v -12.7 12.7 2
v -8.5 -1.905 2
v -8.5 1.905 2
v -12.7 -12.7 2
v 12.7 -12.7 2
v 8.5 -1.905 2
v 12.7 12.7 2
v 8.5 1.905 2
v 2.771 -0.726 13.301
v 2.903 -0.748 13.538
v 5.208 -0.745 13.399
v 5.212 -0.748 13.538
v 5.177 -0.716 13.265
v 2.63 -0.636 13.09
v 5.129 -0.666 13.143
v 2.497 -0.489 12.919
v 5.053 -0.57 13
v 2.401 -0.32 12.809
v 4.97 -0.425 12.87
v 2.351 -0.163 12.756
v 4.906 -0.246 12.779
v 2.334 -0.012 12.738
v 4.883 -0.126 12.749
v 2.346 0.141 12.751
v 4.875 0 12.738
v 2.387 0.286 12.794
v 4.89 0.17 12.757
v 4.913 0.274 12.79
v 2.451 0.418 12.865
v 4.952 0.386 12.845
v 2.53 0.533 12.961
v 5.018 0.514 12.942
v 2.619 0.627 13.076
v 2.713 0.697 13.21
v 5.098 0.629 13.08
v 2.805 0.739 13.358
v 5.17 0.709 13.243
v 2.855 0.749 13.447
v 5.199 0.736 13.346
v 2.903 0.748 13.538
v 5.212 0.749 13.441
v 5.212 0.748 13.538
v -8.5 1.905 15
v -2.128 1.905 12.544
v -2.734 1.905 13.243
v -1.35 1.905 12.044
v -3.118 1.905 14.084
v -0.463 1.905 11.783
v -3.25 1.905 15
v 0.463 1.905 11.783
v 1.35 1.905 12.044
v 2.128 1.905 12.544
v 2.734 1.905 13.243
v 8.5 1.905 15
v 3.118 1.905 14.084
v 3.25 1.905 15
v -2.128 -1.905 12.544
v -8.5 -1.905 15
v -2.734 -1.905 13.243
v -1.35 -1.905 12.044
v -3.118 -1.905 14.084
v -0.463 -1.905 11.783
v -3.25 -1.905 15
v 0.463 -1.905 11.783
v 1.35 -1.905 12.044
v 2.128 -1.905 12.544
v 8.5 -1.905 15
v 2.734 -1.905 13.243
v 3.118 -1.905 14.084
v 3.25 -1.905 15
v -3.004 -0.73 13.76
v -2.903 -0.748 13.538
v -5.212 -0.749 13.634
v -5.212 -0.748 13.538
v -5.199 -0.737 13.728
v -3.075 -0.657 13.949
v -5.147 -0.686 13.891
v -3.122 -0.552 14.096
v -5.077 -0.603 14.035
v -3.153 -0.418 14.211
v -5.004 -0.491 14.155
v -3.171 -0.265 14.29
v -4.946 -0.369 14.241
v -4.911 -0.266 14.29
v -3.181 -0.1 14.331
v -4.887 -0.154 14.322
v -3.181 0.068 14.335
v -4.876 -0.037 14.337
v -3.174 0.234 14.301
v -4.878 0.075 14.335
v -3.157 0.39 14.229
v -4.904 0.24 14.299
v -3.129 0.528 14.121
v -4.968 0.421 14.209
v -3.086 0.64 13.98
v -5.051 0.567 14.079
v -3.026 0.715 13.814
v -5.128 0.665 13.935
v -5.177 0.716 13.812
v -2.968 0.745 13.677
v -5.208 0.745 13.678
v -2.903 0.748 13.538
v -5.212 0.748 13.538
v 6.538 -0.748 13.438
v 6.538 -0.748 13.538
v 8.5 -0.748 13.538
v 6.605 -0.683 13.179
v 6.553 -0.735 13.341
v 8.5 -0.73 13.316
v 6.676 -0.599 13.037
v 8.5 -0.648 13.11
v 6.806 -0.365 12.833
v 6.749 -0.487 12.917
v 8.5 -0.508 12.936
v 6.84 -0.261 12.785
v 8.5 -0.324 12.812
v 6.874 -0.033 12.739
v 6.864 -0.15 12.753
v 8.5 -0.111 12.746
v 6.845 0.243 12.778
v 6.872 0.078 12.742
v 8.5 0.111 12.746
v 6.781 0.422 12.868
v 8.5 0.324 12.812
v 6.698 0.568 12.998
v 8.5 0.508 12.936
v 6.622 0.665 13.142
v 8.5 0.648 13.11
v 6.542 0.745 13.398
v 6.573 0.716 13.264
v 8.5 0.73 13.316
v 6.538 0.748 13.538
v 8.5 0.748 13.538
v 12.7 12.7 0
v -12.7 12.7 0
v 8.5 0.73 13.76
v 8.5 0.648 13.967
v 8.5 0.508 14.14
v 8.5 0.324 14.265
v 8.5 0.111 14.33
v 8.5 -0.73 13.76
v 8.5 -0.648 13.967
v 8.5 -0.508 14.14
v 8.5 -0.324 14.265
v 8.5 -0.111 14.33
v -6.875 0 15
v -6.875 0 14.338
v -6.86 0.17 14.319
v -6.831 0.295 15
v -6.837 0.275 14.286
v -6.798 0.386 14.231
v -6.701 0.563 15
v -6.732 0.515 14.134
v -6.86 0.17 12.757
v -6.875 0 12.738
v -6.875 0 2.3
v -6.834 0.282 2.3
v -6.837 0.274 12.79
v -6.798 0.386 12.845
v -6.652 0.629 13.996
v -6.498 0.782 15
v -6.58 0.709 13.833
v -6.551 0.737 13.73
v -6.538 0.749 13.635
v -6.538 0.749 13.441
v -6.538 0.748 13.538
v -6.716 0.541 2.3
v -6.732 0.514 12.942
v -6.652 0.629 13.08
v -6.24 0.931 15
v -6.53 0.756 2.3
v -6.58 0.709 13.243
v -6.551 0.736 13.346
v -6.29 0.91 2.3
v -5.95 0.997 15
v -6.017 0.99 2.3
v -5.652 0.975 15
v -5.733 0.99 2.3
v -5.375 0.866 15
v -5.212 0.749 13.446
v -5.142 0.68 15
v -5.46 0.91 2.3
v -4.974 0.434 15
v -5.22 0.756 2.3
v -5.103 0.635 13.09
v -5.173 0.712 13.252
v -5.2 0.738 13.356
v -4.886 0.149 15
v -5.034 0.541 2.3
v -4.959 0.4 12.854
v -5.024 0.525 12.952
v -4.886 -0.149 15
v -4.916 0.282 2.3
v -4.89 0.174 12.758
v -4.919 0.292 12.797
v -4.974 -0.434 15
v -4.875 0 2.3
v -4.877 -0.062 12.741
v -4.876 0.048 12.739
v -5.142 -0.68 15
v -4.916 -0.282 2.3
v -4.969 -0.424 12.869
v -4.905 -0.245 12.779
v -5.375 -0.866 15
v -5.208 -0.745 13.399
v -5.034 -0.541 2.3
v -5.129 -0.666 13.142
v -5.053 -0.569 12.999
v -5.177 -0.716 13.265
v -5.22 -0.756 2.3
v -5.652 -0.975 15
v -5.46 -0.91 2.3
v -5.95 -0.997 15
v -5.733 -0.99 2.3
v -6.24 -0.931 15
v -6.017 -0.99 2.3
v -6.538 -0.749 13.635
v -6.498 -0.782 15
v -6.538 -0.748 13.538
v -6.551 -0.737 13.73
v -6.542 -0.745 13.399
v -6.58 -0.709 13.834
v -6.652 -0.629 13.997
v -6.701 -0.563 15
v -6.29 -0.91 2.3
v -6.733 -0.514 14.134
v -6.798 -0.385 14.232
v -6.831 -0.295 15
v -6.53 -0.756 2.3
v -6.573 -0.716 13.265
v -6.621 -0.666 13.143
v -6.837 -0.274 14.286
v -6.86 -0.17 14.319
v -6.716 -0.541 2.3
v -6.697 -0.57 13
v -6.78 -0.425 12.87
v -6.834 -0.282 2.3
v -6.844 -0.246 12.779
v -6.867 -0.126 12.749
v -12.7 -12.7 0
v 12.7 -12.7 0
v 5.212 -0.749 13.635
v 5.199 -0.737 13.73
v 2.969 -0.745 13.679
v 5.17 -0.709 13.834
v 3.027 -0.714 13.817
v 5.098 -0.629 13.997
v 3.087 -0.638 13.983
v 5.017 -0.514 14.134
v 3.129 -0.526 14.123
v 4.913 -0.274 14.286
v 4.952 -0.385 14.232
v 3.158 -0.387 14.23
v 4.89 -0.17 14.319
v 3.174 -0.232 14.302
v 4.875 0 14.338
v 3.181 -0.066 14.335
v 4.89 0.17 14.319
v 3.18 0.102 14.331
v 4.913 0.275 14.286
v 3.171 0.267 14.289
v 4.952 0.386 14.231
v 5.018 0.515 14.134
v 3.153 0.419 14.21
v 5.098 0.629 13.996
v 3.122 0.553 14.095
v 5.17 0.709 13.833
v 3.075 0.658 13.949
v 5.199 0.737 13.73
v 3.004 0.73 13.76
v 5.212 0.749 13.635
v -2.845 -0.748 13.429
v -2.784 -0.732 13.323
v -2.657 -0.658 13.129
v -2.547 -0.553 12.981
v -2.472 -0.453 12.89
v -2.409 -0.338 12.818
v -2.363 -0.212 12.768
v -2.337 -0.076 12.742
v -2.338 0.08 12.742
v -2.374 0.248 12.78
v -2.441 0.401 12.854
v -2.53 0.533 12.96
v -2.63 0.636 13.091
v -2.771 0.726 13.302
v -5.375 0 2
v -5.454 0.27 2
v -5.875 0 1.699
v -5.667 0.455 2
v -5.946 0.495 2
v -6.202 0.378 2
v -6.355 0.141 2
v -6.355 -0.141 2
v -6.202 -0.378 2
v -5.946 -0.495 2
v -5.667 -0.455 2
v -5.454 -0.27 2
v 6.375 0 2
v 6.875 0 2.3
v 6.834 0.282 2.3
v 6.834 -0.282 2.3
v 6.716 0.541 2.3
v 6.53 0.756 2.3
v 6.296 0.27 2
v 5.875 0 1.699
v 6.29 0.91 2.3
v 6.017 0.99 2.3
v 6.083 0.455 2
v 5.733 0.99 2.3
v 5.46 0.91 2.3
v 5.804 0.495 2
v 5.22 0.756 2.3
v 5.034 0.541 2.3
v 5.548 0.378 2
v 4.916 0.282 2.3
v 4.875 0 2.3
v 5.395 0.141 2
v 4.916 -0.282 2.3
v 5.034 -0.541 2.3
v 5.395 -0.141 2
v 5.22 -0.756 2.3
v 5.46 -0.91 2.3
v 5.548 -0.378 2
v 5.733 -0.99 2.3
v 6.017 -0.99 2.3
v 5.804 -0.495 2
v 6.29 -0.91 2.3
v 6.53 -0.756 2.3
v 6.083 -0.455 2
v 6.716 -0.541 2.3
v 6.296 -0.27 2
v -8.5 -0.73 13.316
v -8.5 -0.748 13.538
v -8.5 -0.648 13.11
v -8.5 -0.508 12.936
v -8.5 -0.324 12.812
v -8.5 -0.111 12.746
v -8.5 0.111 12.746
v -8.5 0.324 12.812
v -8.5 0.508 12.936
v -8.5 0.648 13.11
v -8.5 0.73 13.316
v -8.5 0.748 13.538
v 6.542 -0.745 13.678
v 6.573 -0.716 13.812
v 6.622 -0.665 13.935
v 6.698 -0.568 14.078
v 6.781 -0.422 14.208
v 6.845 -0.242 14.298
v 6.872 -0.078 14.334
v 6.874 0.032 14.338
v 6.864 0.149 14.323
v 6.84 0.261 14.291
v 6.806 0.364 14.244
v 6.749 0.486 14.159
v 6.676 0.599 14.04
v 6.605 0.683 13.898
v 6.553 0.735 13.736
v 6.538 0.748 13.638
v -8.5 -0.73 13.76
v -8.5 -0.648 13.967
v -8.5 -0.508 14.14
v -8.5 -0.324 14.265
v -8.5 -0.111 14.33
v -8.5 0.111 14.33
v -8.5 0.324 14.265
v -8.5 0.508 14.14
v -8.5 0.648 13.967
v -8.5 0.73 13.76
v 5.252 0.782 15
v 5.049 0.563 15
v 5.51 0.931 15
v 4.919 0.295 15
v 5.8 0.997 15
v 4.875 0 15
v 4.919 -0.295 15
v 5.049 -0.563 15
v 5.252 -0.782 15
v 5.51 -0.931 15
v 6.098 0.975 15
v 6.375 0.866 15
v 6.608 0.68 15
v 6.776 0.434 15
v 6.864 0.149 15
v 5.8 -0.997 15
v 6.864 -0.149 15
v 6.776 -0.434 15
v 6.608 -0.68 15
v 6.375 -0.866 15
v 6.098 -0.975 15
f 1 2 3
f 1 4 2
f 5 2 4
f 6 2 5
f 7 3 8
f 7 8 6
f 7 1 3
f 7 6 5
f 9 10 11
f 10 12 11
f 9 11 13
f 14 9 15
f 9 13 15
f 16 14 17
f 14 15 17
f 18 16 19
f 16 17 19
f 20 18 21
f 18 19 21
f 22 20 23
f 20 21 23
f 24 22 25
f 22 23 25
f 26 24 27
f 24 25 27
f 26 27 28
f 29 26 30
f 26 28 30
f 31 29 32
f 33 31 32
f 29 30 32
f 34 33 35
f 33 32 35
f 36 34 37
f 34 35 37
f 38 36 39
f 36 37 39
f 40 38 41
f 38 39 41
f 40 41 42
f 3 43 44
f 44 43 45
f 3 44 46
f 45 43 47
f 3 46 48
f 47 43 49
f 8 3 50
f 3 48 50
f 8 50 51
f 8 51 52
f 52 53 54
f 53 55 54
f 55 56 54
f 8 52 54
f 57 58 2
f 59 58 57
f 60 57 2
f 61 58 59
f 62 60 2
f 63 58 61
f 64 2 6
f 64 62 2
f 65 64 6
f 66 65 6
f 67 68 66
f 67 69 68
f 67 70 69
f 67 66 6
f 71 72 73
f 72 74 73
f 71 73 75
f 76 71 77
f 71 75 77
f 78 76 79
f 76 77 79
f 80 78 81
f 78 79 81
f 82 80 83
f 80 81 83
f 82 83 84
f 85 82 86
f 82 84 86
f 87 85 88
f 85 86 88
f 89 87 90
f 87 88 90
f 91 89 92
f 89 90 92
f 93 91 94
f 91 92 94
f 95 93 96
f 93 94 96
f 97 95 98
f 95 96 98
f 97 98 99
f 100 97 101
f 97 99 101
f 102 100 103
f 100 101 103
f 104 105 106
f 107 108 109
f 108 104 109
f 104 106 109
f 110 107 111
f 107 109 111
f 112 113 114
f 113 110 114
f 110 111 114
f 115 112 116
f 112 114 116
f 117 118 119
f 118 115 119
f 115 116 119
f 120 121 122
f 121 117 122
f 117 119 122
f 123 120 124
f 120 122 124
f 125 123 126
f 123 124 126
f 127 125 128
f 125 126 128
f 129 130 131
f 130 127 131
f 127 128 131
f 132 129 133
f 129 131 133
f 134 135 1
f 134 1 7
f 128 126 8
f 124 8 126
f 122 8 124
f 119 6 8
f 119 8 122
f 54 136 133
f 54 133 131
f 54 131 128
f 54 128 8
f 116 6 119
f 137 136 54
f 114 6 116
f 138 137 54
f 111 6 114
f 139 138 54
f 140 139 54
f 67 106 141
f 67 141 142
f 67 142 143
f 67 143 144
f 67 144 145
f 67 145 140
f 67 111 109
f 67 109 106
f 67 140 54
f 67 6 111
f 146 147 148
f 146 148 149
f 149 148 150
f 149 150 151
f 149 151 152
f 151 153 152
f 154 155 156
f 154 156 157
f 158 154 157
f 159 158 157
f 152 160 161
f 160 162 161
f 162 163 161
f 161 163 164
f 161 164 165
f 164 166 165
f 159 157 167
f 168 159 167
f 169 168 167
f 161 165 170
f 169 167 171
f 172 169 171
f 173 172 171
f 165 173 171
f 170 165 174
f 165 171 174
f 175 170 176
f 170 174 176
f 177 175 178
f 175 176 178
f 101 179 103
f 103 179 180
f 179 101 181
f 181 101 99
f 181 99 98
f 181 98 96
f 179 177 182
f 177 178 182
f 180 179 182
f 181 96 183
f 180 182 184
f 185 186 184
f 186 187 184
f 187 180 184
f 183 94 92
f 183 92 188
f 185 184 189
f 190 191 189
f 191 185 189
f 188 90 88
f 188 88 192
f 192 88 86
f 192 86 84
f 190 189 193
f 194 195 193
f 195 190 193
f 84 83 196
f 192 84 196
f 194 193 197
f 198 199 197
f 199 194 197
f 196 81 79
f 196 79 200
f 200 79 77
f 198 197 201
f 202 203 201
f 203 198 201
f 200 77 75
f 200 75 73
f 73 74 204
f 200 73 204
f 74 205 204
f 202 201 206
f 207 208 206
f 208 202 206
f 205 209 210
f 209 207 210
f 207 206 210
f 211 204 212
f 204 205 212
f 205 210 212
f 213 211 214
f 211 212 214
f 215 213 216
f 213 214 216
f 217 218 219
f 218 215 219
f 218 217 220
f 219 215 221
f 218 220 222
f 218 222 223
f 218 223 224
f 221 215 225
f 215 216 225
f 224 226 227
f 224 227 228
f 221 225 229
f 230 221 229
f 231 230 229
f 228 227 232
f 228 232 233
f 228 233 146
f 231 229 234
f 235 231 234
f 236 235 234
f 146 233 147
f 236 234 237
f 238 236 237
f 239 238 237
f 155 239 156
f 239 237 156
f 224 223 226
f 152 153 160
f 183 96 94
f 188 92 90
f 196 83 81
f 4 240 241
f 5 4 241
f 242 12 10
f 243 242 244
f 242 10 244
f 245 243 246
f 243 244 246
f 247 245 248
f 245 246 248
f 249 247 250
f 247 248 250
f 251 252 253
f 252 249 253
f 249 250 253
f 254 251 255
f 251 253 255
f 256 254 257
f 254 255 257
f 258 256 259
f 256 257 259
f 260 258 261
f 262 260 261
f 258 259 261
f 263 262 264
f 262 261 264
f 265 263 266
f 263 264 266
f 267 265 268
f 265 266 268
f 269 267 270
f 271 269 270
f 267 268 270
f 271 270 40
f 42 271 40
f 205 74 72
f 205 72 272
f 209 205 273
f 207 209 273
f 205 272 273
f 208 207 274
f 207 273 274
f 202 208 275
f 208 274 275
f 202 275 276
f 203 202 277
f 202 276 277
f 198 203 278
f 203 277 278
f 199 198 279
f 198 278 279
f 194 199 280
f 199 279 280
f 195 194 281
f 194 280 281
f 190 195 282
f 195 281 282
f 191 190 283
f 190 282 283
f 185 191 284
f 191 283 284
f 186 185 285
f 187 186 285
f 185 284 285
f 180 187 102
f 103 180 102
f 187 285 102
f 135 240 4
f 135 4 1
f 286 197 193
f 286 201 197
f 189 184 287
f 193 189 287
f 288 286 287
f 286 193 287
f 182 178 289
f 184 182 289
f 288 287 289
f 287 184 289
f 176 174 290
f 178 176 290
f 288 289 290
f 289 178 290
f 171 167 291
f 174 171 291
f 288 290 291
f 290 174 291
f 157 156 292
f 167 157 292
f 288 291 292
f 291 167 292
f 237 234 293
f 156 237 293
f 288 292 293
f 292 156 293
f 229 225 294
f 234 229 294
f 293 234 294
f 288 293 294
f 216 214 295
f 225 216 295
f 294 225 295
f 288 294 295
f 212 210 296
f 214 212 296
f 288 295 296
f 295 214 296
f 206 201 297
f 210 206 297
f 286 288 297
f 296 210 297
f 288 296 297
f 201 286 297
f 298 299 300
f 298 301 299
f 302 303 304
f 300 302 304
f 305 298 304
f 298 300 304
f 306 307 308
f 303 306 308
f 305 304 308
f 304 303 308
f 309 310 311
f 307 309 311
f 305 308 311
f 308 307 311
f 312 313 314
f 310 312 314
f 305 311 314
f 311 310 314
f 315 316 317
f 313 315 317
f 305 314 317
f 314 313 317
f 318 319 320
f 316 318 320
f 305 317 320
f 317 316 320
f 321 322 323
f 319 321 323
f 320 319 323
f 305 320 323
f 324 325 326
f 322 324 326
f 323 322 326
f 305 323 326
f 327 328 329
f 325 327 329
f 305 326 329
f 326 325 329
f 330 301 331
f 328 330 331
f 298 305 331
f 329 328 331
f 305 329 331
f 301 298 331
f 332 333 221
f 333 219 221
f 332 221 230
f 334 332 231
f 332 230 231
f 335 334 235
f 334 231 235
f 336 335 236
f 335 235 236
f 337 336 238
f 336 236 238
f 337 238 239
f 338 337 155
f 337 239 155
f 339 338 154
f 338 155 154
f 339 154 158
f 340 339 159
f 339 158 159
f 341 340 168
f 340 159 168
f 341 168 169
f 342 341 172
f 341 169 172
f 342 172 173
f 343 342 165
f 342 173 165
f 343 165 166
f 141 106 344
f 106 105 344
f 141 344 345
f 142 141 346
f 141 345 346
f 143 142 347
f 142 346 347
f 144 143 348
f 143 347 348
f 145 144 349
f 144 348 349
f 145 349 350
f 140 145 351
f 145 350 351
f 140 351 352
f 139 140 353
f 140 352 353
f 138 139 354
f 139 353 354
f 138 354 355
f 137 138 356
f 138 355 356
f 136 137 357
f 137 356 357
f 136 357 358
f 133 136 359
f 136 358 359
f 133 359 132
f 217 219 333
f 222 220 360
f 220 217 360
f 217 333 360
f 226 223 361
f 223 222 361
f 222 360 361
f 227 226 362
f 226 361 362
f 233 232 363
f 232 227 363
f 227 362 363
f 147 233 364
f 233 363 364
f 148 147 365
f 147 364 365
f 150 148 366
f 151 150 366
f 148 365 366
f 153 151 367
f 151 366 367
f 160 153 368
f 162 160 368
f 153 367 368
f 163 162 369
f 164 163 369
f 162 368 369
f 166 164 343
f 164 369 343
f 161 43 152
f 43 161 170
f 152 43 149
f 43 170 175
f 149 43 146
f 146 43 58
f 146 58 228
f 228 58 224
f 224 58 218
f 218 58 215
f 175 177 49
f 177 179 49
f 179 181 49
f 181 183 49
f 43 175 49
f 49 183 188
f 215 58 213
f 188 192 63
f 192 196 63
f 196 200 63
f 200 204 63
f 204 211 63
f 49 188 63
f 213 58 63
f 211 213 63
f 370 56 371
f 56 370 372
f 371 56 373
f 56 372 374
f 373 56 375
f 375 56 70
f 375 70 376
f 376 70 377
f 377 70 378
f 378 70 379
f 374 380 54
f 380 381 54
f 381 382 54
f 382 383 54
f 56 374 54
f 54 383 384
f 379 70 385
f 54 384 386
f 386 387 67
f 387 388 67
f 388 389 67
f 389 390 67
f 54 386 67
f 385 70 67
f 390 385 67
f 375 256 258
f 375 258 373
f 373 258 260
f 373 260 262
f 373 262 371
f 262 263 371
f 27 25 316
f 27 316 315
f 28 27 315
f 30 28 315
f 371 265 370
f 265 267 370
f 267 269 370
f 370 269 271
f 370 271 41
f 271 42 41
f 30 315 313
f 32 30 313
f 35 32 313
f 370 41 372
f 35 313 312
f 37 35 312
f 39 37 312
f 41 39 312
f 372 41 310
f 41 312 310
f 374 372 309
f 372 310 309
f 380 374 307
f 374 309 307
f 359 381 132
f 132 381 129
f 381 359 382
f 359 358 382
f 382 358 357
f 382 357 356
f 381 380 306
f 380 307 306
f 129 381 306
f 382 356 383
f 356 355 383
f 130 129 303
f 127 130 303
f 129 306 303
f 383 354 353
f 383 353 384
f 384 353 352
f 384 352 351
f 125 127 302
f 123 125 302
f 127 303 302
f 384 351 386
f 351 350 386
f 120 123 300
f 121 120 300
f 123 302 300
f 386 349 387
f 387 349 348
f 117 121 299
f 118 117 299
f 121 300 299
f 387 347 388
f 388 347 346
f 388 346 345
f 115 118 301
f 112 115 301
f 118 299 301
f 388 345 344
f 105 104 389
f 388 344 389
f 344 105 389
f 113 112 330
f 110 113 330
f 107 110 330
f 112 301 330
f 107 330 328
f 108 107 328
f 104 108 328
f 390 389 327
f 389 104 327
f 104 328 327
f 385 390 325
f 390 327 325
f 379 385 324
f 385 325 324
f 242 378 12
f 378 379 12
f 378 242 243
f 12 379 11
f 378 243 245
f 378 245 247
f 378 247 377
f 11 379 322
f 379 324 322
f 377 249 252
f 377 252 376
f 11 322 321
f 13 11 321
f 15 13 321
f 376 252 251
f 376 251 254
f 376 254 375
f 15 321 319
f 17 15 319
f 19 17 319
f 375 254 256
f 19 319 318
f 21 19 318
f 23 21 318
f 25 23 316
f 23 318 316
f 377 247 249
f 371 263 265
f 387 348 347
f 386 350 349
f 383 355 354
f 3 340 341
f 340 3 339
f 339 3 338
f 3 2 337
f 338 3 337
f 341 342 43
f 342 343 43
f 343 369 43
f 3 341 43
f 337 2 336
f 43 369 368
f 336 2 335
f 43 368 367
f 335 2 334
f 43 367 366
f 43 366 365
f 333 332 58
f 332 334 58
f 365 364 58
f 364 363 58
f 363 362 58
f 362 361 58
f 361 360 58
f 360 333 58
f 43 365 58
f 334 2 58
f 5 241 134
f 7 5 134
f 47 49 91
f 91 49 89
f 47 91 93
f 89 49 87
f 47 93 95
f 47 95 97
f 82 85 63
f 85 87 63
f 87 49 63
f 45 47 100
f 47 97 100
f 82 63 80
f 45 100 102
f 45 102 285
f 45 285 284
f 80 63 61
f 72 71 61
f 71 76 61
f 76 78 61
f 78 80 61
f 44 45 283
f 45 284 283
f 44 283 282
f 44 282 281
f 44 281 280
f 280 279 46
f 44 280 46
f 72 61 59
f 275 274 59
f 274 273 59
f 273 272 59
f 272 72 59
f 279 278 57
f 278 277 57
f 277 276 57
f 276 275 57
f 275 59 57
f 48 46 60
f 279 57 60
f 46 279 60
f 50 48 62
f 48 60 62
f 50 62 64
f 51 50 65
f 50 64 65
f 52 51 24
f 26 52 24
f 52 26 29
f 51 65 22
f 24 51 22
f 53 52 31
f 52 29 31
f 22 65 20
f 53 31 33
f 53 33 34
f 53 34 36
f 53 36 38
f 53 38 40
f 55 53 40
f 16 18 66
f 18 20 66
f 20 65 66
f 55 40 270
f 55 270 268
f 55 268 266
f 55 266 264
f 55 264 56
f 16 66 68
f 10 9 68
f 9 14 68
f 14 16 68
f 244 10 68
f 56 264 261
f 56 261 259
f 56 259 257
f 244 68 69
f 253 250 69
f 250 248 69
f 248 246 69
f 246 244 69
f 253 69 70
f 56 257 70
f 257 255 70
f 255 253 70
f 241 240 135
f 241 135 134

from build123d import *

# Parameters (mm, degrees)
F0_W        = 25.4
F0_H        = 25.4
F1_DEPTH    = 2
F2_W        = 17
F2_H        = 15
F3_DEPTH    = 1.905
F4_R        = 3.25
F5_DEPTH    = 2.6162
F7_D        = 2
F7_DEPTH    = 12.7
F7_TIP      = 0.600860619
F10_D       = 1.5
F10_ON_F8_D = 1.5


with BuildPart() as f1:
    # F0 (on Top) → F1 (new body)
    with BuildSketch(Plane.XY):
        Rectangle(F0_W, F0_H)
    extrude(amount=F1_DEPTH)

    # F2 (on Front) → F3 (join, symmetric)
    with BuildSketch(Plane.XZ):
        with Locations((0, 7.5)):
            Rectangle(F2_W, F2_H)
    extrude(amount=F3_DEPTH, both=True)

    # F4 (on Front) → F5 (cut, symmetric)
    with BuildSketch(Plane.XZ):
        with Locations((0, 15)):
            Circle(F4_R)
    extrude(amount=F5_DEPTH, both=True, mode=Mode.SUBTRACT)

    # F7
    with Locations(Plane.XY.offset(15)):
        with Locations((5.875, 0), (-5.875, 0)):
            Hole(F7_D / 2, depth=F7_DEPTH)
            with Locations((0, 0, -(F7_DEPTH + F7_TIP / 2))):  # 118° drill point
                Cone(0, F7_D / 2, F7_TIP, mode=Mode.SUBTRACT)

    # F10 (through all)
    with Locations(Plane.YZ.offset(8.5)):
        with Locations((0, 13.5882580653)):
            Hole(F10_D / 2)

    # F10 on F8 (through all)
    with Locations(Plane(origin=(-8.5, 0, 0), x_dir=(0, -1, 0), z_dir=(-1, 0, 0))):
        with Locations((0, 13.4879248217)):
            Hole(F10_ON_F8_D / 2)


solid = f1.part
